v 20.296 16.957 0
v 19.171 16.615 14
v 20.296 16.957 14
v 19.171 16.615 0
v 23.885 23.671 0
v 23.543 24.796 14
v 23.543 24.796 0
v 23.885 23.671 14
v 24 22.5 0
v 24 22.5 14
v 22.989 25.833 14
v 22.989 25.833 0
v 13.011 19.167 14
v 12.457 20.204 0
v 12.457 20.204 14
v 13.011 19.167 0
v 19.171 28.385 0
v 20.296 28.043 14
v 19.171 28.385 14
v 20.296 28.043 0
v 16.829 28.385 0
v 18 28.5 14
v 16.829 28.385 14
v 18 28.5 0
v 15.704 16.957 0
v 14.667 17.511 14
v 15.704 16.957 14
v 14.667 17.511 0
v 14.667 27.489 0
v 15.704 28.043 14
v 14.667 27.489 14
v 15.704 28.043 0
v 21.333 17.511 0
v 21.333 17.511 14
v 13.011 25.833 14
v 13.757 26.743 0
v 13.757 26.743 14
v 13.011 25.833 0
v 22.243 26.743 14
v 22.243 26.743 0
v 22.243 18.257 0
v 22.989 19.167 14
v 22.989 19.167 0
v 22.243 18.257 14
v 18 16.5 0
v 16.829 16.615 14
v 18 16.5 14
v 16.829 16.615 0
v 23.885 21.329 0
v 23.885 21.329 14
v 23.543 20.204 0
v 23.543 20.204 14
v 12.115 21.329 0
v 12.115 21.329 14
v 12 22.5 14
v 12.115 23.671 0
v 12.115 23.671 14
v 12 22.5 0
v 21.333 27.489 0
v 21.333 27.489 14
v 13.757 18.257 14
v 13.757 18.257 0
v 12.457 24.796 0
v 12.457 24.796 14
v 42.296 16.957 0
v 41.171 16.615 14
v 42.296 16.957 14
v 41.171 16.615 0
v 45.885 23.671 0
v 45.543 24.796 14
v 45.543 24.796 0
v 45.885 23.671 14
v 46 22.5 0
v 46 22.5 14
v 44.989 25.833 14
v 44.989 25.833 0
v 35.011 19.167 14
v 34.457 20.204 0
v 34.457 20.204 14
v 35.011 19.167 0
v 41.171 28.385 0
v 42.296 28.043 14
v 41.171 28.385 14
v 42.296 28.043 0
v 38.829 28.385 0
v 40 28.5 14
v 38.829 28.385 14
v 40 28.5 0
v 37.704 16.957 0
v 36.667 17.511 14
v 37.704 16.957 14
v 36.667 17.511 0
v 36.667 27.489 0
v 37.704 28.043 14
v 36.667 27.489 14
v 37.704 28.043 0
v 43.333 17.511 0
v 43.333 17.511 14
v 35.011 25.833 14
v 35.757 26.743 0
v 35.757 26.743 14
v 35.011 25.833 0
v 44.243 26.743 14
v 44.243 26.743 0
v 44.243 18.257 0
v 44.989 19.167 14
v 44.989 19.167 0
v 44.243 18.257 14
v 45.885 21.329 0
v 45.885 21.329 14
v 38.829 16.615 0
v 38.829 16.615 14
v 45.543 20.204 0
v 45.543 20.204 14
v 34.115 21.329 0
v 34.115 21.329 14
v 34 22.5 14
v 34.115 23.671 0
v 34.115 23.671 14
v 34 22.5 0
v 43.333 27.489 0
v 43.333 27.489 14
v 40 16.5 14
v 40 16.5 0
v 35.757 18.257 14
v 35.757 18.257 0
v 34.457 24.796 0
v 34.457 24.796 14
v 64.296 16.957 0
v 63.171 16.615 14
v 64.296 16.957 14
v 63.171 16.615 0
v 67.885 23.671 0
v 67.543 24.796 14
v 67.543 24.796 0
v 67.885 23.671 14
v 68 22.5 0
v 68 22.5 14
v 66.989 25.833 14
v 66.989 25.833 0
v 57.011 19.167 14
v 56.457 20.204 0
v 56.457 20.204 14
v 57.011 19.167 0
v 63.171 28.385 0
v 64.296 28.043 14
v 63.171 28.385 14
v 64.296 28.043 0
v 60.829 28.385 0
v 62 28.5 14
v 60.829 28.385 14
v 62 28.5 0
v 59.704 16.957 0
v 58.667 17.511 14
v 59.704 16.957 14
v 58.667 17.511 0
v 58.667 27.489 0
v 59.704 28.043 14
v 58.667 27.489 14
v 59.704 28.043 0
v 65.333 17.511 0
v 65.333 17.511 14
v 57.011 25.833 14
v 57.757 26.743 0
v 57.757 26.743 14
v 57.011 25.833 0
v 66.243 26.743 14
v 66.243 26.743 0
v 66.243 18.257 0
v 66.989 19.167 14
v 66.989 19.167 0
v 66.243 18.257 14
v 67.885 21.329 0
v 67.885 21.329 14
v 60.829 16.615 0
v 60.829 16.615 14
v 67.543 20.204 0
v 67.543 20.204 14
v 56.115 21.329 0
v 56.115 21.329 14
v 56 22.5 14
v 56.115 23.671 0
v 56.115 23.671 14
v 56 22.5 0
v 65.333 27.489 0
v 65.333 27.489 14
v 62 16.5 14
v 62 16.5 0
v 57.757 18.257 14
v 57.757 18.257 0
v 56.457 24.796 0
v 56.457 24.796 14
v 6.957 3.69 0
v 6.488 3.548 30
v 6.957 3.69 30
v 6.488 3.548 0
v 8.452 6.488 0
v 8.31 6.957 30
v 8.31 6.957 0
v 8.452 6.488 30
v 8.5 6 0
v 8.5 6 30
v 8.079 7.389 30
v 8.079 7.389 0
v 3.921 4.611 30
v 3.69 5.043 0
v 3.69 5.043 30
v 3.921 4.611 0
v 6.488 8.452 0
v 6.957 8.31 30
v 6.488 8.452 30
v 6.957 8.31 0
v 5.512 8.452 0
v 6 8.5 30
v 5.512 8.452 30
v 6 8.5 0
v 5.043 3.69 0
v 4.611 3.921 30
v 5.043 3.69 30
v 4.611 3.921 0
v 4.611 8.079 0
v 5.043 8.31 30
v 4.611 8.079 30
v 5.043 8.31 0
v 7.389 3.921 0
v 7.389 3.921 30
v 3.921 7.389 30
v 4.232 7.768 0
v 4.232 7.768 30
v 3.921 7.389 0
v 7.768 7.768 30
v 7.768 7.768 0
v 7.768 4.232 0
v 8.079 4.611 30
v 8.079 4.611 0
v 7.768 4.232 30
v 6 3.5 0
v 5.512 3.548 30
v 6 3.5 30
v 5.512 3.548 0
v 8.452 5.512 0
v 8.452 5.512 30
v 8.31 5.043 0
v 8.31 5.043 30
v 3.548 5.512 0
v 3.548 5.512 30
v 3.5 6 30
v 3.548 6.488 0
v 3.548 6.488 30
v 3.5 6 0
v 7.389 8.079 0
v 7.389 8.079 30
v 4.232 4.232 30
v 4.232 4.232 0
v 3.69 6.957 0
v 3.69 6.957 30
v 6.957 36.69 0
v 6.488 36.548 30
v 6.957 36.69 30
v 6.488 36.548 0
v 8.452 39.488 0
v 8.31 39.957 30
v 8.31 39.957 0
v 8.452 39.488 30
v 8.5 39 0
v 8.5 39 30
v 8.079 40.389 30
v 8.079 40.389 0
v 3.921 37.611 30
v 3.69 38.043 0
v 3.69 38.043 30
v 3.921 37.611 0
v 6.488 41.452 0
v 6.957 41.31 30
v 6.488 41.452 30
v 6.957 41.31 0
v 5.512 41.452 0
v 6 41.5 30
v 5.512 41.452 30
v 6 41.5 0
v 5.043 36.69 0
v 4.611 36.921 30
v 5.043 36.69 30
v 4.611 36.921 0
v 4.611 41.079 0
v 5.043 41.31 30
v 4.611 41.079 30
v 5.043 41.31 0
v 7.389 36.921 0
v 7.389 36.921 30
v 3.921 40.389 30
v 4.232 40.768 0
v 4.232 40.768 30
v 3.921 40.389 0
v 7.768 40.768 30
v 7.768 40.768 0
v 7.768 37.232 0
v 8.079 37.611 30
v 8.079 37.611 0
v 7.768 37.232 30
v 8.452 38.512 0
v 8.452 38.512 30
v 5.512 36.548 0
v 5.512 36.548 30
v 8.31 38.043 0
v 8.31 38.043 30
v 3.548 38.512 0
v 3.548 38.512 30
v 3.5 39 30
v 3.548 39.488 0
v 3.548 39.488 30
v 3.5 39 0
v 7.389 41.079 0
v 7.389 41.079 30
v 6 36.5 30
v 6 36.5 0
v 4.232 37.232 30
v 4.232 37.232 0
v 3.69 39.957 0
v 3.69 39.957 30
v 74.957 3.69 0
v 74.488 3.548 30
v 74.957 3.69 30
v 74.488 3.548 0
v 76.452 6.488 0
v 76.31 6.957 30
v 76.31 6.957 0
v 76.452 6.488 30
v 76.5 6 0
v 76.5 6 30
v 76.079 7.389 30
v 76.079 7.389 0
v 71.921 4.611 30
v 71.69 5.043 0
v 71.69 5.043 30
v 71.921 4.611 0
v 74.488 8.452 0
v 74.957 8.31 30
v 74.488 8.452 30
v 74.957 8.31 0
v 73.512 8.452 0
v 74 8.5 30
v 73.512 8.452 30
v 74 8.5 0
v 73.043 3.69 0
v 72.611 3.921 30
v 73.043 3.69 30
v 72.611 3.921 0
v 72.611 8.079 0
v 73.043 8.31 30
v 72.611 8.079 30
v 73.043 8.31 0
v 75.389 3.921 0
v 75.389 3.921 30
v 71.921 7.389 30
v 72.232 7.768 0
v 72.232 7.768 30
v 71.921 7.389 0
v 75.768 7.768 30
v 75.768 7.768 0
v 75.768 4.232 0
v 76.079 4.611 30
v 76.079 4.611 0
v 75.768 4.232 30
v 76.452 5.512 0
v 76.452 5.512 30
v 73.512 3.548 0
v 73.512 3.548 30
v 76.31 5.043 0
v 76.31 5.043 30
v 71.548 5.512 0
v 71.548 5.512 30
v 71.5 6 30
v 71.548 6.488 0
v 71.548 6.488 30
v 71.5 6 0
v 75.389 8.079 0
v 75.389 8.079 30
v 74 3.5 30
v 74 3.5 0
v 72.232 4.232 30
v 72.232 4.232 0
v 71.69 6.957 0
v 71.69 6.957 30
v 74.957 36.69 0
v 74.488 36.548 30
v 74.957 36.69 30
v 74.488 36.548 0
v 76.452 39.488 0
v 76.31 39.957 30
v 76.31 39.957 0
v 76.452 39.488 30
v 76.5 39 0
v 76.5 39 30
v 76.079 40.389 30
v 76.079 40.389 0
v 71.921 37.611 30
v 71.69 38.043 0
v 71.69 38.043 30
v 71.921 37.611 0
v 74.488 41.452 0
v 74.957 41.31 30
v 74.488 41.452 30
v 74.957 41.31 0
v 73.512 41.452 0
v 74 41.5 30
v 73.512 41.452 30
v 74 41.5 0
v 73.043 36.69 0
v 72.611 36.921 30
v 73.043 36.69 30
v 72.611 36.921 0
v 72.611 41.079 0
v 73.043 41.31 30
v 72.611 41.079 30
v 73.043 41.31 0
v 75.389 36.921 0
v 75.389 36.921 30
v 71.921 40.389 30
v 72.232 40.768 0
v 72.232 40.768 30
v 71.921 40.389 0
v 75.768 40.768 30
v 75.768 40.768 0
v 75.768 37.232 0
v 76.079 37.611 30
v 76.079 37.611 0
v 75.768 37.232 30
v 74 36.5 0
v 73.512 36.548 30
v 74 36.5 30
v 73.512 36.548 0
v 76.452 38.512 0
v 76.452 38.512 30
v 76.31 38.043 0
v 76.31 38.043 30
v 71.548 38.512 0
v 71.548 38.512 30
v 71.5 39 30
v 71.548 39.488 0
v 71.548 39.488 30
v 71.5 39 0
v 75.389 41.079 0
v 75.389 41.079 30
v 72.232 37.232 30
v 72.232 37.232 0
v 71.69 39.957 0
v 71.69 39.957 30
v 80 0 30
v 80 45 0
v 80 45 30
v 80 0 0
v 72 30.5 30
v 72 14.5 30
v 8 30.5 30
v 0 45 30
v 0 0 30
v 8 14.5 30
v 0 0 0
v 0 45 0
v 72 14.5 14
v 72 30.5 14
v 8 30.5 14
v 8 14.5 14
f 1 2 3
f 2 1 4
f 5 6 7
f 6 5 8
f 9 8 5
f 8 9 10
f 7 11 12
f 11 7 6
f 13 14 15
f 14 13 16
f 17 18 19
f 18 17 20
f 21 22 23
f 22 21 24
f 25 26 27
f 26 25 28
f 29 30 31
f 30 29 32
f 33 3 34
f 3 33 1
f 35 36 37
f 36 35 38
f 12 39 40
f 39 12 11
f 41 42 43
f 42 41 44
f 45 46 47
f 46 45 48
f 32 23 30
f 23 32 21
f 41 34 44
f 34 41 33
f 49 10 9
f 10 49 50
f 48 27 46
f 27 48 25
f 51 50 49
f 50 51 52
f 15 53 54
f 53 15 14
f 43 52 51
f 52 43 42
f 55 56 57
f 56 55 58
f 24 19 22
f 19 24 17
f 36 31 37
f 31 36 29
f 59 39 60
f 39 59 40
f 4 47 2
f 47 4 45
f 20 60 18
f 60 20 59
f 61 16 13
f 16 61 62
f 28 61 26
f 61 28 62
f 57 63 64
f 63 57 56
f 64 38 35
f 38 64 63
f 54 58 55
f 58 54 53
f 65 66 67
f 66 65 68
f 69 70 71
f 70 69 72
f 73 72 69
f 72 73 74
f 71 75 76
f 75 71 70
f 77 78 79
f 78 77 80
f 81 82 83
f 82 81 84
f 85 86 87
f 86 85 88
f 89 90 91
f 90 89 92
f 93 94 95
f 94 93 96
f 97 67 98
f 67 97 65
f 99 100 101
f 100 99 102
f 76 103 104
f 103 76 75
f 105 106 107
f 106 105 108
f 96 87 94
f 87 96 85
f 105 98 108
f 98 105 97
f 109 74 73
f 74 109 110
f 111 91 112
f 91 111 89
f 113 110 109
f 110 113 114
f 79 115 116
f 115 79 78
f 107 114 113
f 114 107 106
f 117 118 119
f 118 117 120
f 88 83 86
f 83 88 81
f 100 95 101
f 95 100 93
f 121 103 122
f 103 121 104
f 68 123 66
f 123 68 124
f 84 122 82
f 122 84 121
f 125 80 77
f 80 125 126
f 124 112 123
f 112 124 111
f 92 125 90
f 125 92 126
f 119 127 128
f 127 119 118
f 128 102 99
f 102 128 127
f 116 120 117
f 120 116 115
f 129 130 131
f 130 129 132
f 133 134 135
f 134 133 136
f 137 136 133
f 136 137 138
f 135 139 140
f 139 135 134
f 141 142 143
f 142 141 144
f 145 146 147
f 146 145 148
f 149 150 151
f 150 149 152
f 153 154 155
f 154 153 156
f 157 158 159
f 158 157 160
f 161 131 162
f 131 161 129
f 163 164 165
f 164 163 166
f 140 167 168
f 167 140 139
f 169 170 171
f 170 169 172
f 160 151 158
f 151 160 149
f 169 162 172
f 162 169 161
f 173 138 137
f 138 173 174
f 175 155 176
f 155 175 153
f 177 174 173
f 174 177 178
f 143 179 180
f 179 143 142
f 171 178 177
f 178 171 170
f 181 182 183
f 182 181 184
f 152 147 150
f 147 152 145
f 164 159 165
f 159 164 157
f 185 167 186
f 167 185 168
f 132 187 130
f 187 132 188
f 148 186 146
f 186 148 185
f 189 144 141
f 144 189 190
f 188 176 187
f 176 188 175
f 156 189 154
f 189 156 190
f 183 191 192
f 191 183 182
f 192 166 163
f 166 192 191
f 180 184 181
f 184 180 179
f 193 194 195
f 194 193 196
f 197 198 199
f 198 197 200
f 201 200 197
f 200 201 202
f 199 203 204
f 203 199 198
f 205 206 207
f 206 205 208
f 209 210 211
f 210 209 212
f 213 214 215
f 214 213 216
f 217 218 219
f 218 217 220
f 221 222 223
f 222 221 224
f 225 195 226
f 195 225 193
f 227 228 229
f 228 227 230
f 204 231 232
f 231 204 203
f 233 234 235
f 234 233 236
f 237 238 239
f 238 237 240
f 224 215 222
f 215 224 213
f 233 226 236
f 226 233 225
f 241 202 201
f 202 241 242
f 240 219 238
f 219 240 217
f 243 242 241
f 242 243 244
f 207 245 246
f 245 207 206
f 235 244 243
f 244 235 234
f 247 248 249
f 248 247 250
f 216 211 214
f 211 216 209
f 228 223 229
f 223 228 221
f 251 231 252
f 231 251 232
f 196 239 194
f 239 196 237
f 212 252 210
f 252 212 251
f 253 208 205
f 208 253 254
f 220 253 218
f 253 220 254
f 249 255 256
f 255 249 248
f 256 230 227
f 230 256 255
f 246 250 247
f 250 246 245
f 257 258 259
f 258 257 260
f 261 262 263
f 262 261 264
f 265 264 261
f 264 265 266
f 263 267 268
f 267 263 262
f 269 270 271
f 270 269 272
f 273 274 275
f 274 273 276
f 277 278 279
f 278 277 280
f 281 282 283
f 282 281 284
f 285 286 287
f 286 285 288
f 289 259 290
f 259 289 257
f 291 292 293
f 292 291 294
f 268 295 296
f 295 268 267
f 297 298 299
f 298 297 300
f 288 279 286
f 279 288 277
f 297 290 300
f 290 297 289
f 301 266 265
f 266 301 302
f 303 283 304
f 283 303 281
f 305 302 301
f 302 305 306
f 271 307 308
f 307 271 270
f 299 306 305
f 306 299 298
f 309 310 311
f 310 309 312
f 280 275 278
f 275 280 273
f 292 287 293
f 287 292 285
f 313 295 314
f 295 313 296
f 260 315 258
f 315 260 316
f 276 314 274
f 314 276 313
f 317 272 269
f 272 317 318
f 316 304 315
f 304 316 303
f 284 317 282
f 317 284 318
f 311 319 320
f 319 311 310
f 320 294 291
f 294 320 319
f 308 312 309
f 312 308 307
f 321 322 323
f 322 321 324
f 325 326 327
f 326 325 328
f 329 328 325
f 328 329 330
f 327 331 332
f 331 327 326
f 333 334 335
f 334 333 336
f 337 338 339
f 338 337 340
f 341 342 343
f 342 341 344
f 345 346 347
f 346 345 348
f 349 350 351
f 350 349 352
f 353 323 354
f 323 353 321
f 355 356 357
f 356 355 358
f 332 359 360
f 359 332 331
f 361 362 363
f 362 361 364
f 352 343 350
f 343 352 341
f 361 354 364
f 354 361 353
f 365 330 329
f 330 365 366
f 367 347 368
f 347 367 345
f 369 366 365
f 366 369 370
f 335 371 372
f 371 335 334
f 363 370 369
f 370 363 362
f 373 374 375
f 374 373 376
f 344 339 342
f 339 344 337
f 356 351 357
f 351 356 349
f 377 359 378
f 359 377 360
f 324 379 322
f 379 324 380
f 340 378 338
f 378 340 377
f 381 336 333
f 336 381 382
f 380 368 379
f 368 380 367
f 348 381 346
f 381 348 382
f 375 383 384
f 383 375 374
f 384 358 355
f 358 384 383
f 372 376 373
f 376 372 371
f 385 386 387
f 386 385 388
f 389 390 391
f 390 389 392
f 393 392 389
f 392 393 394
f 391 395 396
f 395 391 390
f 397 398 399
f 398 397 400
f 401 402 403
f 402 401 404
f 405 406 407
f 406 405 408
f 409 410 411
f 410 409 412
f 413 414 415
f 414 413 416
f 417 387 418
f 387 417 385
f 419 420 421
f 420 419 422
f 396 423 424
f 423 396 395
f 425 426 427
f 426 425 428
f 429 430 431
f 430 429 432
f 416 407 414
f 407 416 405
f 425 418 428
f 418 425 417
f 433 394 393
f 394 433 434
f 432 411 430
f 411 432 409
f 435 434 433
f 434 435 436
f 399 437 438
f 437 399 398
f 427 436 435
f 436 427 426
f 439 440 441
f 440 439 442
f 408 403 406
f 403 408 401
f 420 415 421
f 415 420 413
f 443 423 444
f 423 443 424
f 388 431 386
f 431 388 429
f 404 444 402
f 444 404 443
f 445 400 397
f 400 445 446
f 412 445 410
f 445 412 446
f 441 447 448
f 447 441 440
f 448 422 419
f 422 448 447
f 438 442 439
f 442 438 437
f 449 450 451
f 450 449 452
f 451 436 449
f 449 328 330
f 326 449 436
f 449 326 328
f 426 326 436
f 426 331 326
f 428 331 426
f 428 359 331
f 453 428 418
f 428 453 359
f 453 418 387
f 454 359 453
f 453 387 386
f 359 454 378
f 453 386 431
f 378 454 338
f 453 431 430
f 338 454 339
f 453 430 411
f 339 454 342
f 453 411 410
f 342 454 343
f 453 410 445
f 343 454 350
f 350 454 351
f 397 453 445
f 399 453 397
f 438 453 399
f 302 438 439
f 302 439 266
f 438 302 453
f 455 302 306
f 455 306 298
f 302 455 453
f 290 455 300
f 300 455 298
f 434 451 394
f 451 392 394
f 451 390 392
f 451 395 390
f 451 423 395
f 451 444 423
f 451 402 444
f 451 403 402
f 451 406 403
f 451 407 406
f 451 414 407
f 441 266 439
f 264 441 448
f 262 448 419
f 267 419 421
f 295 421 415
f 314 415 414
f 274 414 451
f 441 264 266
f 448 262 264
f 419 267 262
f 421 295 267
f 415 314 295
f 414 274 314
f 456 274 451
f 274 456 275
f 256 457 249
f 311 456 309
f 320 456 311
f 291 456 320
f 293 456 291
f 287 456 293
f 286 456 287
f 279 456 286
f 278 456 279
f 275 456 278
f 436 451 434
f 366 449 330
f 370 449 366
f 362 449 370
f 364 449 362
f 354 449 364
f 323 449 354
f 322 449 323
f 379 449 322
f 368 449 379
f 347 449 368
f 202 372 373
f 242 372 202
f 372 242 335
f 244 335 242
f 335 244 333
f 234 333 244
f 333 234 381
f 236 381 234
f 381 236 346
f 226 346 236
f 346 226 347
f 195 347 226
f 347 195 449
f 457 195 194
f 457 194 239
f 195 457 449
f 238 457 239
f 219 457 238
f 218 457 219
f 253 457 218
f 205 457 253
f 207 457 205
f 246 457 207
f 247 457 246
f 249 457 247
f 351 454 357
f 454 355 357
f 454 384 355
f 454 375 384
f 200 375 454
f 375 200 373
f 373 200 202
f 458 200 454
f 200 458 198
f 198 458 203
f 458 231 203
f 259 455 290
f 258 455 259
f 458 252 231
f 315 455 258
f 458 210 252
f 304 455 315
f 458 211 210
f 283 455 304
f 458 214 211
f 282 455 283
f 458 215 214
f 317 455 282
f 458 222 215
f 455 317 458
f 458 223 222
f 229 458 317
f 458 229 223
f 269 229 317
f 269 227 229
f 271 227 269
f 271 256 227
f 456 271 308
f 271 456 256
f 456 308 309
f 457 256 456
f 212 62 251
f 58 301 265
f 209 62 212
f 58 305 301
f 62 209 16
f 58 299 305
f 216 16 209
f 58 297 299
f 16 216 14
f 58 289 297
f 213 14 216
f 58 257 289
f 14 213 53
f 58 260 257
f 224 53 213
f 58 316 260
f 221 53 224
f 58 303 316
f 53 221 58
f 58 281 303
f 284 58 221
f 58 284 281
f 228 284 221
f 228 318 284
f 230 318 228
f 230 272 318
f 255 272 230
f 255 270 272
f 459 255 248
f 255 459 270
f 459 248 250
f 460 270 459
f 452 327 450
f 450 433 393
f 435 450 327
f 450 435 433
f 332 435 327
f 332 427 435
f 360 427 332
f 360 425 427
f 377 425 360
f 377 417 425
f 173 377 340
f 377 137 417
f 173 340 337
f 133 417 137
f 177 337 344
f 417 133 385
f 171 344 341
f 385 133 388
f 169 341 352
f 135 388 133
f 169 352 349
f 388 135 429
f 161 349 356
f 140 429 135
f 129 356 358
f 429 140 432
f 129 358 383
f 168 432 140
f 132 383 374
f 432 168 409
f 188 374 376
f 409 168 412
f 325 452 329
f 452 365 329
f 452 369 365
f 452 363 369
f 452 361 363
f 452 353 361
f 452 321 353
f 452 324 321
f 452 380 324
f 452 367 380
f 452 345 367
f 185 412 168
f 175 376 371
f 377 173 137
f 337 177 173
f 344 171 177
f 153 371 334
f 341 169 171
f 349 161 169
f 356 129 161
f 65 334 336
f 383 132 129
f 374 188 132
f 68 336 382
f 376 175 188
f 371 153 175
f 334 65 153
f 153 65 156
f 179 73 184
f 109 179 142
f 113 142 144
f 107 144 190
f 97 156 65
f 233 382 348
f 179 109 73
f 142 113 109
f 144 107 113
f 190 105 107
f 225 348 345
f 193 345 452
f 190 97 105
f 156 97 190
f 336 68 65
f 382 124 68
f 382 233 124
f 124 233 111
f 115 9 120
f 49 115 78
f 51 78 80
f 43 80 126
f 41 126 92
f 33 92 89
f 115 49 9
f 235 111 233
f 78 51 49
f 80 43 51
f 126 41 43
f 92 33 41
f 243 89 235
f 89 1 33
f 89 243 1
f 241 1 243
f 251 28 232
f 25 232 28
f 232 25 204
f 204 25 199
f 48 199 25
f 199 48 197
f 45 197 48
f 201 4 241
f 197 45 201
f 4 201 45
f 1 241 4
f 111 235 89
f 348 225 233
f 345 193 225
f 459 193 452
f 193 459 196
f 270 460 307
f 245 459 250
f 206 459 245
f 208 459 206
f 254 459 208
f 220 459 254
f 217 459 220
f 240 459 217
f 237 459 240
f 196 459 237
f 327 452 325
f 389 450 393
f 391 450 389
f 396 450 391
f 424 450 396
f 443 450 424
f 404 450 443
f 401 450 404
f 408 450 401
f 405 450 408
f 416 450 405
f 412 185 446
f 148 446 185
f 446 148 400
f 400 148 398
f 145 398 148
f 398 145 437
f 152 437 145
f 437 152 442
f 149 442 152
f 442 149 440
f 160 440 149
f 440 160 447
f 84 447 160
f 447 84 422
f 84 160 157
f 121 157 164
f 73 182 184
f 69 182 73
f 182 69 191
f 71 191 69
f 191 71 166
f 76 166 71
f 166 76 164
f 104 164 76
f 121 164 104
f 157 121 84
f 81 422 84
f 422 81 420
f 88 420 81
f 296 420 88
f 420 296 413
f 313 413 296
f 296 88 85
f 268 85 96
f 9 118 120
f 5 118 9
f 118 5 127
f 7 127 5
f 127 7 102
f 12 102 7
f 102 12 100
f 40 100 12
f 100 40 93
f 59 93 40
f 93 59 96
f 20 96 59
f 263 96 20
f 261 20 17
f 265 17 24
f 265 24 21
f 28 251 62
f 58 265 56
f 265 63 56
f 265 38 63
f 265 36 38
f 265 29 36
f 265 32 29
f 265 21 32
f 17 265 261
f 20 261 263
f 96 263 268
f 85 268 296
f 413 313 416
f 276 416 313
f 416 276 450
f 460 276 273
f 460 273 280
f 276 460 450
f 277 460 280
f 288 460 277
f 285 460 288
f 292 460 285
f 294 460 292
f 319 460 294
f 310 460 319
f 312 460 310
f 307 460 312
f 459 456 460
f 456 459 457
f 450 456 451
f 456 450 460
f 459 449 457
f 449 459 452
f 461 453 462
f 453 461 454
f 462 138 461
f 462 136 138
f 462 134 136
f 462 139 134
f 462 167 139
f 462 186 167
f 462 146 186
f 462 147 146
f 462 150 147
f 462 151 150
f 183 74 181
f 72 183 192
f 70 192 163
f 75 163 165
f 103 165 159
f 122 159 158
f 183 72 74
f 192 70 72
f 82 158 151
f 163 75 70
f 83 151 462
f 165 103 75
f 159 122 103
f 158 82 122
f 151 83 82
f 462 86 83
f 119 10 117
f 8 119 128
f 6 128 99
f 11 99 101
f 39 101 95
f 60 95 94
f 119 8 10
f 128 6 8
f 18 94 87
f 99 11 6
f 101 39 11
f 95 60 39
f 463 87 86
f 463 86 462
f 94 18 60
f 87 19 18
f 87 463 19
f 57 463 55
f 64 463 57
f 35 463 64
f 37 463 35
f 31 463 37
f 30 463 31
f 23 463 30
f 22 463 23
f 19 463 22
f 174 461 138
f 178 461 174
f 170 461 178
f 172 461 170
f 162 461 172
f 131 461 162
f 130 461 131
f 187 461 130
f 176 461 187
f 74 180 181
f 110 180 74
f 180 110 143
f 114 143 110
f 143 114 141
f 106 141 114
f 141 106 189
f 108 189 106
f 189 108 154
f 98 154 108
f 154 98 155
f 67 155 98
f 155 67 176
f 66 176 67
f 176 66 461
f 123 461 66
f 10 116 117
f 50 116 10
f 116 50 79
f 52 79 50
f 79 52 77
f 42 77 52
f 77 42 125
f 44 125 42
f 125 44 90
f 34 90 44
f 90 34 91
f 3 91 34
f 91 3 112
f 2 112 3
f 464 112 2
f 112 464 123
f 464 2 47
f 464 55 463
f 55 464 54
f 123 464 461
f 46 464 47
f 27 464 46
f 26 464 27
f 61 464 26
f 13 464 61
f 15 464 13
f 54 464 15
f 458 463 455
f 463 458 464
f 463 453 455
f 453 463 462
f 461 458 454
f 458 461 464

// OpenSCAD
$fn = 32;

// ----------------------------------------------------------------------
// Manifold block: gallery_top manifold
// ----------------------------------------------------------------------

// --- parameters (mm) ---
block_l = 80;             // block length, X
block_w = 45;             // block width, Y
block_h = 30;             // block height, Z
port_d = 12;              // port bore diameter
port_pitch = 22;          // port pitch along X
gallery_d = 16;           // top gallery width, Y
gallery_depth = 16;       // gallery pocket depth
wall_p = 8;               // gallery end wall thickness, X
mnt_d = 5;                // mounting hole diameter
mnt_in = 6;               // mounting hole inset from the edges

n_ports = 3;  // ports in the row
port_x0 = (block_l - (n_ports - 1) * port_pitch) / 2;  // first port X

difference() {
  cube([block_l, block_w, block_h]);
  for (i = [0 : n_ports - 1])
    translate([port_x0 + i * port_pitch, block_w / 2, -1])
      cylinder(h = block_h + 2, d = port_d);
  translate([wall_p, block_w / 2 - gallery_d / 2, block_h - gallery_depth])
    cube([block_l - 2 * wall_p, gallery_d, gallery_depth + 1]);
  for (cx = [mnt_in, block_l - mnt_in])
    for (cy = [mnt_in, block_w - mnt_in])
      translate([cx, cy, -1]) cylinder(h = block_h + 2, d = mnt_d);
}
